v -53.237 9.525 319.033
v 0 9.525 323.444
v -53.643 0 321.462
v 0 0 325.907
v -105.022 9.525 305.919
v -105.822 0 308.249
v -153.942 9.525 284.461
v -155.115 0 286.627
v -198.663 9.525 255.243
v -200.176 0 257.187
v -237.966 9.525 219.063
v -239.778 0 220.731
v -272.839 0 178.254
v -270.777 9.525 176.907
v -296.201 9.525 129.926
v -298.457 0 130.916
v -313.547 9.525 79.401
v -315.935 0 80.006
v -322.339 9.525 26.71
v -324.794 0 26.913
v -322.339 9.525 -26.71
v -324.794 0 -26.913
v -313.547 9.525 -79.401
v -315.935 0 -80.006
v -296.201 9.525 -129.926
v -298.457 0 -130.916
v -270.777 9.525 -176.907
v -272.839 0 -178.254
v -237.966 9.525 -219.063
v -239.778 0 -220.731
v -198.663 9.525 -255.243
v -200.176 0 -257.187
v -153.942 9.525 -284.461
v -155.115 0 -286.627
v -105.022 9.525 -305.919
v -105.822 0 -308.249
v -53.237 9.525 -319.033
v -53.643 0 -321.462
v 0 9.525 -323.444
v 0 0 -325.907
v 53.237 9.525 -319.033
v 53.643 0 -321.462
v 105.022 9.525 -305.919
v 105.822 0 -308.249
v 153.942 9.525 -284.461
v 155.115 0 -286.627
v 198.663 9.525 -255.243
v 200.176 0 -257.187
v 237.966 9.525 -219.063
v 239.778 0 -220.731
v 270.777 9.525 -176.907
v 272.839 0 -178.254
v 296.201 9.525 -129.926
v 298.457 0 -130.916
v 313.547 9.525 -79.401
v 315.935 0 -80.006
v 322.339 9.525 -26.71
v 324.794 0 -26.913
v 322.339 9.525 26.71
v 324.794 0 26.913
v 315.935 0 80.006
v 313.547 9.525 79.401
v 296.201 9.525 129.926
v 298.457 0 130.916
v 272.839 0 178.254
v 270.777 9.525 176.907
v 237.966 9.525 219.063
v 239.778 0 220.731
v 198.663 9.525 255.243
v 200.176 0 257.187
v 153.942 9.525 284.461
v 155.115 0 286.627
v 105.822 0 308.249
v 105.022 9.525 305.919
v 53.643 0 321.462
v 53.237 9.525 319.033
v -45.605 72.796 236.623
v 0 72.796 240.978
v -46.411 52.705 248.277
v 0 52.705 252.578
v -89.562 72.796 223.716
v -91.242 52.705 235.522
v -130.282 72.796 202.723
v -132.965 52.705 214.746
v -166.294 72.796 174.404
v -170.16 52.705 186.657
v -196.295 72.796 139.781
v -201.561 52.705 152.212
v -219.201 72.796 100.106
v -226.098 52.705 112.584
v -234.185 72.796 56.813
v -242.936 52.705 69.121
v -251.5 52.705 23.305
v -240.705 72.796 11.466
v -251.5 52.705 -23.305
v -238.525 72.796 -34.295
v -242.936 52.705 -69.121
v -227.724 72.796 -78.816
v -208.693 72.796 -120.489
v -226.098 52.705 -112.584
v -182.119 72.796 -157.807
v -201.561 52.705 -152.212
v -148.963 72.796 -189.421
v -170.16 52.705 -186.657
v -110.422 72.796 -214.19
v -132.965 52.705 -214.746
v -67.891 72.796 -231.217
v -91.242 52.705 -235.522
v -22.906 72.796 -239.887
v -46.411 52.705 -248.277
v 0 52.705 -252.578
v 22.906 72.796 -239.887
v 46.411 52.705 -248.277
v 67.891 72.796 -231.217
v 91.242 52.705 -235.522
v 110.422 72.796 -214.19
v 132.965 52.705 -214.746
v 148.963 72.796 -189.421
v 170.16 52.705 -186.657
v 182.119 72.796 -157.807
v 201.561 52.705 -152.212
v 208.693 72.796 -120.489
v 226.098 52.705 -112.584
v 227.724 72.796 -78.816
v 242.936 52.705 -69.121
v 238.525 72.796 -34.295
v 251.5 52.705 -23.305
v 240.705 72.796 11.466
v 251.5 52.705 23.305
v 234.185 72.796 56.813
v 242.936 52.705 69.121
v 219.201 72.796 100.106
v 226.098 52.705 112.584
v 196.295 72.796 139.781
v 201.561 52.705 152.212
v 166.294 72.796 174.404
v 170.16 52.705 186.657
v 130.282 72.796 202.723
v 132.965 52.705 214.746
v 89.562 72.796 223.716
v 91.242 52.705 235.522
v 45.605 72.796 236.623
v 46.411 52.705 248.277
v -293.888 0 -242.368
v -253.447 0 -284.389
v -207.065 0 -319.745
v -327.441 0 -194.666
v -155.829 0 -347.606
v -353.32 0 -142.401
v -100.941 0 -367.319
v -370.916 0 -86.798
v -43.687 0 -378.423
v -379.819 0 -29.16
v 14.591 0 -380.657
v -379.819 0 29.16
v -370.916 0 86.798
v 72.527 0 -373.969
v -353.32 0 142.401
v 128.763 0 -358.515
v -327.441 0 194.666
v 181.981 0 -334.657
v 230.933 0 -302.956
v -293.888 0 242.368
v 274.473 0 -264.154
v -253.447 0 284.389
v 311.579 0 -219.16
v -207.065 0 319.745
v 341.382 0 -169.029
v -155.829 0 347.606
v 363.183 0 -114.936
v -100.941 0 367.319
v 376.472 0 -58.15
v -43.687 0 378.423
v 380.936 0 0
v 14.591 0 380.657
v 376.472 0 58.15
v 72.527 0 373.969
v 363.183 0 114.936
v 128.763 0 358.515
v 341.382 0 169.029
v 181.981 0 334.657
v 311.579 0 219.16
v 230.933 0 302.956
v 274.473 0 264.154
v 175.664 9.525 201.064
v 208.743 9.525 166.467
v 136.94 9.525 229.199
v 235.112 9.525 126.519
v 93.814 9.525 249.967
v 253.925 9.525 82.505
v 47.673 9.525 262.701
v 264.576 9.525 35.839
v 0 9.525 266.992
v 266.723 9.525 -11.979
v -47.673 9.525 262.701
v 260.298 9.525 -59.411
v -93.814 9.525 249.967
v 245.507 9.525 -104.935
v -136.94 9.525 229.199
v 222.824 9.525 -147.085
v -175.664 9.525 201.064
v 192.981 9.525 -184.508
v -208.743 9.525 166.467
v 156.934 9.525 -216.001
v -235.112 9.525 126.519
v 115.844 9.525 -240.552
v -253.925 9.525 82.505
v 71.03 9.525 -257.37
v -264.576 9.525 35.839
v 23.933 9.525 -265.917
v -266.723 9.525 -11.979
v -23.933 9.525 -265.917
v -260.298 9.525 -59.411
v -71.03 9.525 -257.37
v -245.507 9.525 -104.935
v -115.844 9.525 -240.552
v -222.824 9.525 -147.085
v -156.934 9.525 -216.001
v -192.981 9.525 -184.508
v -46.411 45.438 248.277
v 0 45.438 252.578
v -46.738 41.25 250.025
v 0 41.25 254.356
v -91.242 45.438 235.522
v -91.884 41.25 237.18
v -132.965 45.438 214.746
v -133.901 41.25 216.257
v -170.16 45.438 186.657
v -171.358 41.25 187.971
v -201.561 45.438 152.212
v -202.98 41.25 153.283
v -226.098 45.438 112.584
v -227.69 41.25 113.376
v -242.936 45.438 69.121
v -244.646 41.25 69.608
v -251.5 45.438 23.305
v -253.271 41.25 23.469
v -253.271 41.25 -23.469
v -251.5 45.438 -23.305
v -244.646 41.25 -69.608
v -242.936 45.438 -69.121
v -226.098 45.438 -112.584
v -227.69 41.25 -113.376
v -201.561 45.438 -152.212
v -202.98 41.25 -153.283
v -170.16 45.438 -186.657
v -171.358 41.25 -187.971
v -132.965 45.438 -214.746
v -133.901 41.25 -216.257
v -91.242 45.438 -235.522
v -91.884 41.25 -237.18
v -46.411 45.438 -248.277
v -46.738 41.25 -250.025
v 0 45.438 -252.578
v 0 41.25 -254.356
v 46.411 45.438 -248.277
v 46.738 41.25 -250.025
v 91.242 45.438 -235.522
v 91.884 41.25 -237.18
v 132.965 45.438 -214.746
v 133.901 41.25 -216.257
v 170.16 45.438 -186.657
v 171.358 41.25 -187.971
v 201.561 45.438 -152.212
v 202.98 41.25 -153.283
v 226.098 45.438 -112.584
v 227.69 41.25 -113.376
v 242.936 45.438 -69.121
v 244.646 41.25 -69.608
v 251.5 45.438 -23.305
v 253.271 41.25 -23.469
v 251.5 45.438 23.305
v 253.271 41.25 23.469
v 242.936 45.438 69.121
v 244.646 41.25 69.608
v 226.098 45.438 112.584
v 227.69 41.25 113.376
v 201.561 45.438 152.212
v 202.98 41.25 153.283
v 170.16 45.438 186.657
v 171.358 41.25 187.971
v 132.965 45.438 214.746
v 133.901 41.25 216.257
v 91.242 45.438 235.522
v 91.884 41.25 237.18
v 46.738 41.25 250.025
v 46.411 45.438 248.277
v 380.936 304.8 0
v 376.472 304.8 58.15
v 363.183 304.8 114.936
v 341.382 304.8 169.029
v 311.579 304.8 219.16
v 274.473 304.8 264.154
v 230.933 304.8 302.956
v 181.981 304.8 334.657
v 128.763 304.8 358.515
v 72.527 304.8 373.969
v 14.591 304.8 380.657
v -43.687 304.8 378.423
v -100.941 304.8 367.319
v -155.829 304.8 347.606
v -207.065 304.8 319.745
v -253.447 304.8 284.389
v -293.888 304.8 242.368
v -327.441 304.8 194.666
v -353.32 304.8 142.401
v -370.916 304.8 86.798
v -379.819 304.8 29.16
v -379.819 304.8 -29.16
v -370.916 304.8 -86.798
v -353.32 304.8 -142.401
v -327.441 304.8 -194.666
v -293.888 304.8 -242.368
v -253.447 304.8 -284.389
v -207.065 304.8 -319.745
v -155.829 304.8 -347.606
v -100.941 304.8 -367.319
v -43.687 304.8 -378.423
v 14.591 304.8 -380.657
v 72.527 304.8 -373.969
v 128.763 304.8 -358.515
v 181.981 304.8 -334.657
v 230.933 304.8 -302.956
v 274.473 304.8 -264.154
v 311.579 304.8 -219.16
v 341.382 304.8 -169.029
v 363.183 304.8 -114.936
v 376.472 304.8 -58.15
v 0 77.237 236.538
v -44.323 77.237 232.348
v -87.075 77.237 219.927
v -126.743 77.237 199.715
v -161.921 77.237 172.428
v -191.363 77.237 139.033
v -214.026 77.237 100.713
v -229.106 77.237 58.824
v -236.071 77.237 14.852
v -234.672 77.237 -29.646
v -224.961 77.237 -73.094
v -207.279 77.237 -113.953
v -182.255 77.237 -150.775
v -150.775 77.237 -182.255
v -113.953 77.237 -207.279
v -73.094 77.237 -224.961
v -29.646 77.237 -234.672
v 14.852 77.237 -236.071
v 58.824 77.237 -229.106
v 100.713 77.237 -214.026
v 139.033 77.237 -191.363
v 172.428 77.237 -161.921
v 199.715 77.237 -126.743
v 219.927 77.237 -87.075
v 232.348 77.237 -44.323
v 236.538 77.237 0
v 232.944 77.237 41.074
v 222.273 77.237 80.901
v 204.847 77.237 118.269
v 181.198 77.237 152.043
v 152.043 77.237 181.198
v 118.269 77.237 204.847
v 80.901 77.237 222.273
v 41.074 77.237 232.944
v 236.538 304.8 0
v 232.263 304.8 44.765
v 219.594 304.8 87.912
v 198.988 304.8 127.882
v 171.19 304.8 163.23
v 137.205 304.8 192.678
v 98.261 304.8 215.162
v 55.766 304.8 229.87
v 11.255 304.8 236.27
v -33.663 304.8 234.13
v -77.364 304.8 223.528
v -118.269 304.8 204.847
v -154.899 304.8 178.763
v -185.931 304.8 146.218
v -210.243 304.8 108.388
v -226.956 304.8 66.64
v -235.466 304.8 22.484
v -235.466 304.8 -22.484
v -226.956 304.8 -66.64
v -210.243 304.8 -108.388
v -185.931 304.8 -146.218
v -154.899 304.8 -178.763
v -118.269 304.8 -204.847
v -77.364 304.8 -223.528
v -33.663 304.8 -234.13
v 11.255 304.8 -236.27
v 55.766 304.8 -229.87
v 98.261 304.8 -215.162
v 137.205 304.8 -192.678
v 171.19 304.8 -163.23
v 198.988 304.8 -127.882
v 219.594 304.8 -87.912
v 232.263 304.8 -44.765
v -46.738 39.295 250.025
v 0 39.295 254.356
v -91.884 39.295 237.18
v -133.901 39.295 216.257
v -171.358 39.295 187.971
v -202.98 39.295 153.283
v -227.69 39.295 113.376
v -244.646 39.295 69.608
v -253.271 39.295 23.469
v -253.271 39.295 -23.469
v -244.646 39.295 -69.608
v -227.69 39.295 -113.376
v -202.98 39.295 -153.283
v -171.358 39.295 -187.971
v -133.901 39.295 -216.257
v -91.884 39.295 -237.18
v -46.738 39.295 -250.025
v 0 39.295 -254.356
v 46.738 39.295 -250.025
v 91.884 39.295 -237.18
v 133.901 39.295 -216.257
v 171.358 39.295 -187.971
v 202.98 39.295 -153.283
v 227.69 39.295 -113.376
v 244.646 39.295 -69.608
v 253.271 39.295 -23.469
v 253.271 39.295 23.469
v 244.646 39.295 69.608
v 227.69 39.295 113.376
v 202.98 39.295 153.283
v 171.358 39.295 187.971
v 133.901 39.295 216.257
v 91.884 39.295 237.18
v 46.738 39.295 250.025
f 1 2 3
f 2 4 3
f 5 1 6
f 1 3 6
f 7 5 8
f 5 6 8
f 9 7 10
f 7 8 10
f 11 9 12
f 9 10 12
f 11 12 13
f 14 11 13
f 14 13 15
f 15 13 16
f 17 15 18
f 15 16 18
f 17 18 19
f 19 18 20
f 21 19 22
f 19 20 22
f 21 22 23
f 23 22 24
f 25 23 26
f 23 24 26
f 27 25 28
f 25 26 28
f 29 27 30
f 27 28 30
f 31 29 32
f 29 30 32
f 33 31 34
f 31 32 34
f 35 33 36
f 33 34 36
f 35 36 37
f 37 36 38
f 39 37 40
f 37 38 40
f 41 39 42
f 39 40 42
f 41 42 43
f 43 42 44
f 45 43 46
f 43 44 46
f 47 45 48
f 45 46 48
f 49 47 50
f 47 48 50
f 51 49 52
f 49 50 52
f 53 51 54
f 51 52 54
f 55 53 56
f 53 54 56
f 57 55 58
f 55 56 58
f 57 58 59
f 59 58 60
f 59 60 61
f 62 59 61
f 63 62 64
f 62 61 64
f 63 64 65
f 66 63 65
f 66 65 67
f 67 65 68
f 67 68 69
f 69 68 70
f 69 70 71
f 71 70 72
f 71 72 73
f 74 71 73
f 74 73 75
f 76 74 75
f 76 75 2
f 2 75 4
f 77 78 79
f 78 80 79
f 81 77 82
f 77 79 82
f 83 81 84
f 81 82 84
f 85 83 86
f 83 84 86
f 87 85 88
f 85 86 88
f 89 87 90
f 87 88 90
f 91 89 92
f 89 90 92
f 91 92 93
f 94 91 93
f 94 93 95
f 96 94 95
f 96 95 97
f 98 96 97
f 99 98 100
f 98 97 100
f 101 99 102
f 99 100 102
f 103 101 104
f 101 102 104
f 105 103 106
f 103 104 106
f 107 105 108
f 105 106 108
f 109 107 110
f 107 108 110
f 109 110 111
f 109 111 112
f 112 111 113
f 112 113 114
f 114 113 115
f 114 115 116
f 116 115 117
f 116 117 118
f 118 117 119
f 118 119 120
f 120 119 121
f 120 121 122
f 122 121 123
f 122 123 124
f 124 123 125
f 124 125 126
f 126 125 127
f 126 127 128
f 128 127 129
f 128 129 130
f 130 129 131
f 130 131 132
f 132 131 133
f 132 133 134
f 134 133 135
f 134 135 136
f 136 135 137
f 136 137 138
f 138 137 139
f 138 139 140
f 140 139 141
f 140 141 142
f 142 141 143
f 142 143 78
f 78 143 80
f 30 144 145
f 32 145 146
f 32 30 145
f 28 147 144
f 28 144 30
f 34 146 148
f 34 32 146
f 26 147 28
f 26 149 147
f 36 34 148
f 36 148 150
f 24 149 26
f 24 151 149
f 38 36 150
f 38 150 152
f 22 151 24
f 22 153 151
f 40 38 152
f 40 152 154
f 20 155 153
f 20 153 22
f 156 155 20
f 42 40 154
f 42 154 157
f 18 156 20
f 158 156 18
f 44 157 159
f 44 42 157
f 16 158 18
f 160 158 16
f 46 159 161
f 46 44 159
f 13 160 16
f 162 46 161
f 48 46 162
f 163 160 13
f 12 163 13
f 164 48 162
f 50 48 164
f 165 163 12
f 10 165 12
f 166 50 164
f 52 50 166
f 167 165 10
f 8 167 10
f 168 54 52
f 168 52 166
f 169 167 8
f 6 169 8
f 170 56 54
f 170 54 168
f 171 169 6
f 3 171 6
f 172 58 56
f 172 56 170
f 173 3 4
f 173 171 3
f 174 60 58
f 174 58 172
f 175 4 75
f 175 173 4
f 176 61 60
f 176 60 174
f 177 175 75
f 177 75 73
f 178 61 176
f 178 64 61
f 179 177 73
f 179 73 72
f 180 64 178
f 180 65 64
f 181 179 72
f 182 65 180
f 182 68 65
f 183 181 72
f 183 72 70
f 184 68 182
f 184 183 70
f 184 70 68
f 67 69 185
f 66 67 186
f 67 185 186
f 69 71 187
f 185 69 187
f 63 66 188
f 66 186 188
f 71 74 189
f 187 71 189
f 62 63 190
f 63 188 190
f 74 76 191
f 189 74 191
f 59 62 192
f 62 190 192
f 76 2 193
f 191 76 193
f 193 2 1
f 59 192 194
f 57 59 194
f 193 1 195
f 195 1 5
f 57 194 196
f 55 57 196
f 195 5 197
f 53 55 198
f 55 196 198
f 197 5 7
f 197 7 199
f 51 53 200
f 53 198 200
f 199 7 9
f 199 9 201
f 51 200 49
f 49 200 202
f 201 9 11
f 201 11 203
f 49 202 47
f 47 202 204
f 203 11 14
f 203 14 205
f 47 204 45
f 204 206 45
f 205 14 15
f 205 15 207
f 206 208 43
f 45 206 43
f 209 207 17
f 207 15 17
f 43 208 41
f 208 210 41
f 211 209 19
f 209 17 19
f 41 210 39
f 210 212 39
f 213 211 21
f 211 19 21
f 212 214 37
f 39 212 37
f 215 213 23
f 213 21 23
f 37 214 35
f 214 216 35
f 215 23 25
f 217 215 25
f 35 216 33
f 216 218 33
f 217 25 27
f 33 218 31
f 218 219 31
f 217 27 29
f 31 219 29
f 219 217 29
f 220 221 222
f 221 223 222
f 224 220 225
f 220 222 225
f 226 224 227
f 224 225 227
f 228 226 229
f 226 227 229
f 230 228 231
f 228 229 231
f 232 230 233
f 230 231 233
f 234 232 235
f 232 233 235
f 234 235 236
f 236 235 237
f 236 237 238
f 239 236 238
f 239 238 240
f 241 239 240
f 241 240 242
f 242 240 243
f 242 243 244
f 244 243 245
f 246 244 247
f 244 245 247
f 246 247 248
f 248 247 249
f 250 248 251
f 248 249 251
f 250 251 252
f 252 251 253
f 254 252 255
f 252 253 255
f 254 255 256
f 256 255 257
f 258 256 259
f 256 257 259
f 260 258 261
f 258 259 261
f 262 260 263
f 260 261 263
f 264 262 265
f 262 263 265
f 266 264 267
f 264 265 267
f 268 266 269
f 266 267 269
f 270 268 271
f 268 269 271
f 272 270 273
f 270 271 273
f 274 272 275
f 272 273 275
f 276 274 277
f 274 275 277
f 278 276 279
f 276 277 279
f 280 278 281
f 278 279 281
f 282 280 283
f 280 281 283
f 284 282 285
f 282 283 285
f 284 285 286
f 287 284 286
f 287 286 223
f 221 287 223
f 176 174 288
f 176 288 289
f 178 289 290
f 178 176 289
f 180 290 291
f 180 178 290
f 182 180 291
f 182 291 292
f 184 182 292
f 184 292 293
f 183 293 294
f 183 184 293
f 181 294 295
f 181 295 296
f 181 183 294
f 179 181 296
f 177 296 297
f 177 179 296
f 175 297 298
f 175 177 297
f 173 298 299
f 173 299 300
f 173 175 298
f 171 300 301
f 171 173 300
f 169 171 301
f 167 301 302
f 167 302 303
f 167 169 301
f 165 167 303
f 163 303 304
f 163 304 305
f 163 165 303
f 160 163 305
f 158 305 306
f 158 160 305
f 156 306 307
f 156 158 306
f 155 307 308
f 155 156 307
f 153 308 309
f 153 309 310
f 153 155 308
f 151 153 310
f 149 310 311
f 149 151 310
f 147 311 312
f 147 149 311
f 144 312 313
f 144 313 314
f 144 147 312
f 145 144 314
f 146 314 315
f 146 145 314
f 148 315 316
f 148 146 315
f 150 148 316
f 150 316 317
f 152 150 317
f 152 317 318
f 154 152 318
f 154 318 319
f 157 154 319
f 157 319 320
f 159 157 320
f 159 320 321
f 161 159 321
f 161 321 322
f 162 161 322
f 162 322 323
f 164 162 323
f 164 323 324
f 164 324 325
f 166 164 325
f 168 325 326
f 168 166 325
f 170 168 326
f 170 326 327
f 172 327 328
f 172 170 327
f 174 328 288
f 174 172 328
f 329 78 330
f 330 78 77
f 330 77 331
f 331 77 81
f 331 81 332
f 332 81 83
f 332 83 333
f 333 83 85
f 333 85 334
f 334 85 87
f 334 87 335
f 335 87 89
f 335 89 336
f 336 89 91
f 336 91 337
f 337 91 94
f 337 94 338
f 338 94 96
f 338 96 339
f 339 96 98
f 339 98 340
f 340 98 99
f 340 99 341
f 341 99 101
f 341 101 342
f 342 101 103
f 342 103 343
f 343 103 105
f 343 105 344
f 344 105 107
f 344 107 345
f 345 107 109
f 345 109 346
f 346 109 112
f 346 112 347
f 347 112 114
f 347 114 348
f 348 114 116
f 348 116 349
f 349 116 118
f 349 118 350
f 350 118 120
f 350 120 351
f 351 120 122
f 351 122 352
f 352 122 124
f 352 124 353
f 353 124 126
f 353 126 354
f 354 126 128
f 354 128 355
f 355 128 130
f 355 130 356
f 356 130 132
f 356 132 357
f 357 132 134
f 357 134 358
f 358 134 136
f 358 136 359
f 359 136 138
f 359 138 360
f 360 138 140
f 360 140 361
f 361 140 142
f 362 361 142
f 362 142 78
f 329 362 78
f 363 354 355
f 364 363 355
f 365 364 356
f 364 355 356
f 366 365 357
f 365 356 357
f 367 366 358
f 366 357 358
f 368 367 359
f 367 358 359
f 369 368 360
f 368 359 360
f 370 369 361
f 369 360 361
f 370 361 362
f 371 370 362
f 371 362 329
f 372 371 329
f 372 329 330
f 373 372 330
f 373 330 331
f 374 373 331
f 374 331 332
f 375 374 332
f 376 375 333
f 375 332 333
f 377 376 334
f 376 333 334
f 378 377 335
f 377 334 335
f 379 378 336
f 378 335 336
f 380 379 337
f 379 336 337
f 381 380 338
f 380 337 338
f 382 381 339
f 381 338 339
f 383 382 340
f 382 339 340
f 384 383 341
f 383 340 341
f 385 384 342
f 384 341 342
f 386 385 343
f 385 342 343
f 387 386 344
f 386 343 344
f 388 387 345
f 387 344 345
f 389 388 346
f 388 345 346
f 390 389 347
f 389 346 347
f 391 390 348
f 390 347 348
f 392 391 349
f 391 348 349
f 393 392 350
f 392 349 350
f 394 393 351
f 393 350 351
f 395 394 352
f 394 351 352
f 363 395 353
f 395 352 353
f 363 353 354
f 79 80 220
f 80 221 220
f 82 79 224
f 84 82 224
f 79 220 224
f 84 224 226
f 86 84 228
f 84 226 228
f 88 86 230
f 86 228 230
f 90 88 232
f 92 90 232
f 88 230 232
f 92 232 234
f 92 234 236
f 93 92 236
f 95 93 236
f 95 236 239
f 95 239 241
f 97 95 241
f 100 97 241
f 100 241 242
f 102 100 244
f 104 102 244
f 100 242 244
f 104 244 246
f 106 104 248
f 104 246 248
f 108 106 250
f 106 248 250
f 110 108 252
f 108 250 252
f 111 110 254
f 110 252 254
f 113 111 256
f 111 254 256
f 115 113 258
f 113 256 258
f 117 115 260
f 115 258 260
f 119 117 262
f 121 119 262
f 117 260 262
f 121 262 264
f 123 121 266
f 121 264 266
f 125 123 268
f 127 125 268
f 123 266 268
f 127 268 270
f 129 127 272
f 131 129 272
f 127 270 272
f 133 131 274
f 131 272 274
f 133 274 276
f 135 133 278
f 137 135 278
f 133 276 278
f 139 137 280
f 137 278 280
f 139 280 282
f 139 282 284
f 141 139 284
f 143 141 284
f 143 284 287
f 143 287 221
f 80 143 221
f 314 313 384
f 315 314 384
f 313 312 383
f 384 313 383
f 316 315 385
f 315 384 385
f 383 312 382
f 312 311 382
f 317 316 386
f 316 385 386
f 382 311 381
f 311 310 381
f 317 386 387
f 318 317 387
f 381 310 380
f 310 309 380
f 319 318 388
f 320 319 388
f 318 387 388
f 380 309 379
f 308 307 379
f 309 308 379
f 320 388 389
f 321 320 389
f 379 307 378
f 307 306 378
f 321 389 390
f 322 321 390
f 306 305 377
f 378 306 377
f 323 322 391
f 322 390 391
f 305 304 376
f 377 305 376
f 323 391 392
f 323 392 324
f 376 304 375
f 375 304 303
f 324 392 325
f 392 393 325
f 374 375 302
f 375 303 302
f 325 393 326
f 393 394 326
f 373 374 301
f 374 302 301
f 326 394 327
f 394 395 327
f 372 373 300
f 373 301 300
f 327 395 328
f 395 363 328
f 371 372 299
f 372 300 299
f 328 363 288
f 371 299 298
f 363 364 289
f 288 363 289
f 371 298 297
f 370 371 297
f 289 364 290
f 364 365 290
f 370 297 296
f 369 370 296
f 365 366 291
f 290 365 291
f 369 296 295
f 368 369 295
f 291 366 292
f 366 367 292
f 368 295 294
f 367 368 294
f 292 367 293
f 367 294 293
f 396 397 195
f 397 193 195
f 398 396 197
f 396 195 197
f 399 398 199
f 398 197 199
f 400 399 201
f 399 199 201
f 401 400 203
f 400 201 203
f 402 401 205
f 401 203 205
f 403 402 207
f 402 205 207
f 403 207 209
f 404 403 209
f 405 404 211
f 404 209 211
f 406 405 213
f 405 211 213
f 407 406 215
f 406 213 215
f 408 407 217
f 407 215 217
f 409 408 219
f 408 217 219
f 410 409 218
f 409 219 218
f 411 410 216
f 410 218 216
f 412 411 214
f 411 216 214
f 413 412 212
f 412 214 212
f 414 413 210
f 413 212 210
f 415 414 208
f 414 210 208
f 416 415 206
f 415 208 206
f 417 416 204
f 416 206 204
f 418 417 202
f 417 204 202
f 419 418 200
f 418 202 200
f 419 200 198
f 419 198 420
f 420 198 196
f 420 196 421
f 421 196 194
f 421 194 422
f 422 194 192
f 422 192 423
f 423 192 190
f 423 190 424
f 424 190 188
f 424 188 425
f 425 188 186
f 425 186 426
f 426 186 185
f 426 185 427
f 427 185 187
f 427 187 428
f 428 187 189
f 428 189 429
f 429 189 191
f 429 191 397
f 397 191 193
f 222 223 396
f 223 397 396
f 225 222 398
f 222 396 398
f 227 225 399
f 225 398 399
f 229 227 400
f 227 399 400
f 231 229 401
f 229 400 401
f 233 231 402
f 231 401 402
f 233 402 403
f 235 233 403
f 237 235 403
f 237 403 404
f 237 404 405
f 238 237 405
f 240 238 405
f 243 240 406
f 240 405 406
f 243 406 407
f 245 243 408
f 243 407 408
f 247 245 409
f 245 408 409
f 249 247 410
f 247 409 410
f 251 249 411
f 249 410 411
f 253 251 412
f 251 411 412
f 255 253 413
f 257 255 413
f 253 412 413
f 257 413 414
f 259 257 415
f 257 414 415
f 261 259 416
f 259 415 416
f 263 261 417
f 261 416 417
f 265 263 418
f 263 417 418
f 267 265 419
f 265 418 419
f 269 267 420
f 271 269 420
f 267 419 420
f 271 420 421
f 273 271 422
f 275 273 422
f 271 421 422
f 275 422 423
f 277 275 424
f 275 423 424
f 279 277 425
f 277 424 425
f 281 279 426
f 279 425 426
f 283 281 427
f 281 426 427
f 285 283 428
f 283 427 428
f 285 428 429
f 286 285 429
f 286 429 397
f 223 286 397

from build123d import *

# Parameters (mm, degrees)
F0_R     = 380.9365
F0_R_2   = 236.5375
F1_DEPTH = 304.8


with BuildPart() as f1:
    # F0 (on Front) → F1 (new body)
    with BuildSketch(Plane.XZ):
        Circle(F0_R)
        Circle(F0_R_2, mode=Mode.SUBTRACT)
    extrude(amount=-F1_DEPTH)

    # F2 (on Right) → F3 (revolve, cut)
    with BuildSketch(Plane.YZ):
        Polygon((-0.674657, 0), (0, 0), (9.525, 0), (9.525, 323.444068), (0, 325.9074), (-38.13795, 325.9074), align=None)
    revolve(axis=Axis((0, -111.905819, 0), (0, -1, 0)), mode=Mode.SUBTRACT)

    # F4 (on Right) → F5 (revolve, cut)
    with BuildSketch(Plane.YZ):
        Polygon((39.294728, 254.3556), (9.525, 266.9921), (-83.954796, 266.9921), (-48.076838, 187.997639), (83.789648, 229.984577), (72.7964, 240.977825), (52.705, 252.5776), (45.438306, 252.5776), (41.2496, 254.3556), align=None)
    revolve(axis=Axis((0, 0, 0), (0, -1, 0)), mode=Mode.SUBTRACT)


solid = f1.part
